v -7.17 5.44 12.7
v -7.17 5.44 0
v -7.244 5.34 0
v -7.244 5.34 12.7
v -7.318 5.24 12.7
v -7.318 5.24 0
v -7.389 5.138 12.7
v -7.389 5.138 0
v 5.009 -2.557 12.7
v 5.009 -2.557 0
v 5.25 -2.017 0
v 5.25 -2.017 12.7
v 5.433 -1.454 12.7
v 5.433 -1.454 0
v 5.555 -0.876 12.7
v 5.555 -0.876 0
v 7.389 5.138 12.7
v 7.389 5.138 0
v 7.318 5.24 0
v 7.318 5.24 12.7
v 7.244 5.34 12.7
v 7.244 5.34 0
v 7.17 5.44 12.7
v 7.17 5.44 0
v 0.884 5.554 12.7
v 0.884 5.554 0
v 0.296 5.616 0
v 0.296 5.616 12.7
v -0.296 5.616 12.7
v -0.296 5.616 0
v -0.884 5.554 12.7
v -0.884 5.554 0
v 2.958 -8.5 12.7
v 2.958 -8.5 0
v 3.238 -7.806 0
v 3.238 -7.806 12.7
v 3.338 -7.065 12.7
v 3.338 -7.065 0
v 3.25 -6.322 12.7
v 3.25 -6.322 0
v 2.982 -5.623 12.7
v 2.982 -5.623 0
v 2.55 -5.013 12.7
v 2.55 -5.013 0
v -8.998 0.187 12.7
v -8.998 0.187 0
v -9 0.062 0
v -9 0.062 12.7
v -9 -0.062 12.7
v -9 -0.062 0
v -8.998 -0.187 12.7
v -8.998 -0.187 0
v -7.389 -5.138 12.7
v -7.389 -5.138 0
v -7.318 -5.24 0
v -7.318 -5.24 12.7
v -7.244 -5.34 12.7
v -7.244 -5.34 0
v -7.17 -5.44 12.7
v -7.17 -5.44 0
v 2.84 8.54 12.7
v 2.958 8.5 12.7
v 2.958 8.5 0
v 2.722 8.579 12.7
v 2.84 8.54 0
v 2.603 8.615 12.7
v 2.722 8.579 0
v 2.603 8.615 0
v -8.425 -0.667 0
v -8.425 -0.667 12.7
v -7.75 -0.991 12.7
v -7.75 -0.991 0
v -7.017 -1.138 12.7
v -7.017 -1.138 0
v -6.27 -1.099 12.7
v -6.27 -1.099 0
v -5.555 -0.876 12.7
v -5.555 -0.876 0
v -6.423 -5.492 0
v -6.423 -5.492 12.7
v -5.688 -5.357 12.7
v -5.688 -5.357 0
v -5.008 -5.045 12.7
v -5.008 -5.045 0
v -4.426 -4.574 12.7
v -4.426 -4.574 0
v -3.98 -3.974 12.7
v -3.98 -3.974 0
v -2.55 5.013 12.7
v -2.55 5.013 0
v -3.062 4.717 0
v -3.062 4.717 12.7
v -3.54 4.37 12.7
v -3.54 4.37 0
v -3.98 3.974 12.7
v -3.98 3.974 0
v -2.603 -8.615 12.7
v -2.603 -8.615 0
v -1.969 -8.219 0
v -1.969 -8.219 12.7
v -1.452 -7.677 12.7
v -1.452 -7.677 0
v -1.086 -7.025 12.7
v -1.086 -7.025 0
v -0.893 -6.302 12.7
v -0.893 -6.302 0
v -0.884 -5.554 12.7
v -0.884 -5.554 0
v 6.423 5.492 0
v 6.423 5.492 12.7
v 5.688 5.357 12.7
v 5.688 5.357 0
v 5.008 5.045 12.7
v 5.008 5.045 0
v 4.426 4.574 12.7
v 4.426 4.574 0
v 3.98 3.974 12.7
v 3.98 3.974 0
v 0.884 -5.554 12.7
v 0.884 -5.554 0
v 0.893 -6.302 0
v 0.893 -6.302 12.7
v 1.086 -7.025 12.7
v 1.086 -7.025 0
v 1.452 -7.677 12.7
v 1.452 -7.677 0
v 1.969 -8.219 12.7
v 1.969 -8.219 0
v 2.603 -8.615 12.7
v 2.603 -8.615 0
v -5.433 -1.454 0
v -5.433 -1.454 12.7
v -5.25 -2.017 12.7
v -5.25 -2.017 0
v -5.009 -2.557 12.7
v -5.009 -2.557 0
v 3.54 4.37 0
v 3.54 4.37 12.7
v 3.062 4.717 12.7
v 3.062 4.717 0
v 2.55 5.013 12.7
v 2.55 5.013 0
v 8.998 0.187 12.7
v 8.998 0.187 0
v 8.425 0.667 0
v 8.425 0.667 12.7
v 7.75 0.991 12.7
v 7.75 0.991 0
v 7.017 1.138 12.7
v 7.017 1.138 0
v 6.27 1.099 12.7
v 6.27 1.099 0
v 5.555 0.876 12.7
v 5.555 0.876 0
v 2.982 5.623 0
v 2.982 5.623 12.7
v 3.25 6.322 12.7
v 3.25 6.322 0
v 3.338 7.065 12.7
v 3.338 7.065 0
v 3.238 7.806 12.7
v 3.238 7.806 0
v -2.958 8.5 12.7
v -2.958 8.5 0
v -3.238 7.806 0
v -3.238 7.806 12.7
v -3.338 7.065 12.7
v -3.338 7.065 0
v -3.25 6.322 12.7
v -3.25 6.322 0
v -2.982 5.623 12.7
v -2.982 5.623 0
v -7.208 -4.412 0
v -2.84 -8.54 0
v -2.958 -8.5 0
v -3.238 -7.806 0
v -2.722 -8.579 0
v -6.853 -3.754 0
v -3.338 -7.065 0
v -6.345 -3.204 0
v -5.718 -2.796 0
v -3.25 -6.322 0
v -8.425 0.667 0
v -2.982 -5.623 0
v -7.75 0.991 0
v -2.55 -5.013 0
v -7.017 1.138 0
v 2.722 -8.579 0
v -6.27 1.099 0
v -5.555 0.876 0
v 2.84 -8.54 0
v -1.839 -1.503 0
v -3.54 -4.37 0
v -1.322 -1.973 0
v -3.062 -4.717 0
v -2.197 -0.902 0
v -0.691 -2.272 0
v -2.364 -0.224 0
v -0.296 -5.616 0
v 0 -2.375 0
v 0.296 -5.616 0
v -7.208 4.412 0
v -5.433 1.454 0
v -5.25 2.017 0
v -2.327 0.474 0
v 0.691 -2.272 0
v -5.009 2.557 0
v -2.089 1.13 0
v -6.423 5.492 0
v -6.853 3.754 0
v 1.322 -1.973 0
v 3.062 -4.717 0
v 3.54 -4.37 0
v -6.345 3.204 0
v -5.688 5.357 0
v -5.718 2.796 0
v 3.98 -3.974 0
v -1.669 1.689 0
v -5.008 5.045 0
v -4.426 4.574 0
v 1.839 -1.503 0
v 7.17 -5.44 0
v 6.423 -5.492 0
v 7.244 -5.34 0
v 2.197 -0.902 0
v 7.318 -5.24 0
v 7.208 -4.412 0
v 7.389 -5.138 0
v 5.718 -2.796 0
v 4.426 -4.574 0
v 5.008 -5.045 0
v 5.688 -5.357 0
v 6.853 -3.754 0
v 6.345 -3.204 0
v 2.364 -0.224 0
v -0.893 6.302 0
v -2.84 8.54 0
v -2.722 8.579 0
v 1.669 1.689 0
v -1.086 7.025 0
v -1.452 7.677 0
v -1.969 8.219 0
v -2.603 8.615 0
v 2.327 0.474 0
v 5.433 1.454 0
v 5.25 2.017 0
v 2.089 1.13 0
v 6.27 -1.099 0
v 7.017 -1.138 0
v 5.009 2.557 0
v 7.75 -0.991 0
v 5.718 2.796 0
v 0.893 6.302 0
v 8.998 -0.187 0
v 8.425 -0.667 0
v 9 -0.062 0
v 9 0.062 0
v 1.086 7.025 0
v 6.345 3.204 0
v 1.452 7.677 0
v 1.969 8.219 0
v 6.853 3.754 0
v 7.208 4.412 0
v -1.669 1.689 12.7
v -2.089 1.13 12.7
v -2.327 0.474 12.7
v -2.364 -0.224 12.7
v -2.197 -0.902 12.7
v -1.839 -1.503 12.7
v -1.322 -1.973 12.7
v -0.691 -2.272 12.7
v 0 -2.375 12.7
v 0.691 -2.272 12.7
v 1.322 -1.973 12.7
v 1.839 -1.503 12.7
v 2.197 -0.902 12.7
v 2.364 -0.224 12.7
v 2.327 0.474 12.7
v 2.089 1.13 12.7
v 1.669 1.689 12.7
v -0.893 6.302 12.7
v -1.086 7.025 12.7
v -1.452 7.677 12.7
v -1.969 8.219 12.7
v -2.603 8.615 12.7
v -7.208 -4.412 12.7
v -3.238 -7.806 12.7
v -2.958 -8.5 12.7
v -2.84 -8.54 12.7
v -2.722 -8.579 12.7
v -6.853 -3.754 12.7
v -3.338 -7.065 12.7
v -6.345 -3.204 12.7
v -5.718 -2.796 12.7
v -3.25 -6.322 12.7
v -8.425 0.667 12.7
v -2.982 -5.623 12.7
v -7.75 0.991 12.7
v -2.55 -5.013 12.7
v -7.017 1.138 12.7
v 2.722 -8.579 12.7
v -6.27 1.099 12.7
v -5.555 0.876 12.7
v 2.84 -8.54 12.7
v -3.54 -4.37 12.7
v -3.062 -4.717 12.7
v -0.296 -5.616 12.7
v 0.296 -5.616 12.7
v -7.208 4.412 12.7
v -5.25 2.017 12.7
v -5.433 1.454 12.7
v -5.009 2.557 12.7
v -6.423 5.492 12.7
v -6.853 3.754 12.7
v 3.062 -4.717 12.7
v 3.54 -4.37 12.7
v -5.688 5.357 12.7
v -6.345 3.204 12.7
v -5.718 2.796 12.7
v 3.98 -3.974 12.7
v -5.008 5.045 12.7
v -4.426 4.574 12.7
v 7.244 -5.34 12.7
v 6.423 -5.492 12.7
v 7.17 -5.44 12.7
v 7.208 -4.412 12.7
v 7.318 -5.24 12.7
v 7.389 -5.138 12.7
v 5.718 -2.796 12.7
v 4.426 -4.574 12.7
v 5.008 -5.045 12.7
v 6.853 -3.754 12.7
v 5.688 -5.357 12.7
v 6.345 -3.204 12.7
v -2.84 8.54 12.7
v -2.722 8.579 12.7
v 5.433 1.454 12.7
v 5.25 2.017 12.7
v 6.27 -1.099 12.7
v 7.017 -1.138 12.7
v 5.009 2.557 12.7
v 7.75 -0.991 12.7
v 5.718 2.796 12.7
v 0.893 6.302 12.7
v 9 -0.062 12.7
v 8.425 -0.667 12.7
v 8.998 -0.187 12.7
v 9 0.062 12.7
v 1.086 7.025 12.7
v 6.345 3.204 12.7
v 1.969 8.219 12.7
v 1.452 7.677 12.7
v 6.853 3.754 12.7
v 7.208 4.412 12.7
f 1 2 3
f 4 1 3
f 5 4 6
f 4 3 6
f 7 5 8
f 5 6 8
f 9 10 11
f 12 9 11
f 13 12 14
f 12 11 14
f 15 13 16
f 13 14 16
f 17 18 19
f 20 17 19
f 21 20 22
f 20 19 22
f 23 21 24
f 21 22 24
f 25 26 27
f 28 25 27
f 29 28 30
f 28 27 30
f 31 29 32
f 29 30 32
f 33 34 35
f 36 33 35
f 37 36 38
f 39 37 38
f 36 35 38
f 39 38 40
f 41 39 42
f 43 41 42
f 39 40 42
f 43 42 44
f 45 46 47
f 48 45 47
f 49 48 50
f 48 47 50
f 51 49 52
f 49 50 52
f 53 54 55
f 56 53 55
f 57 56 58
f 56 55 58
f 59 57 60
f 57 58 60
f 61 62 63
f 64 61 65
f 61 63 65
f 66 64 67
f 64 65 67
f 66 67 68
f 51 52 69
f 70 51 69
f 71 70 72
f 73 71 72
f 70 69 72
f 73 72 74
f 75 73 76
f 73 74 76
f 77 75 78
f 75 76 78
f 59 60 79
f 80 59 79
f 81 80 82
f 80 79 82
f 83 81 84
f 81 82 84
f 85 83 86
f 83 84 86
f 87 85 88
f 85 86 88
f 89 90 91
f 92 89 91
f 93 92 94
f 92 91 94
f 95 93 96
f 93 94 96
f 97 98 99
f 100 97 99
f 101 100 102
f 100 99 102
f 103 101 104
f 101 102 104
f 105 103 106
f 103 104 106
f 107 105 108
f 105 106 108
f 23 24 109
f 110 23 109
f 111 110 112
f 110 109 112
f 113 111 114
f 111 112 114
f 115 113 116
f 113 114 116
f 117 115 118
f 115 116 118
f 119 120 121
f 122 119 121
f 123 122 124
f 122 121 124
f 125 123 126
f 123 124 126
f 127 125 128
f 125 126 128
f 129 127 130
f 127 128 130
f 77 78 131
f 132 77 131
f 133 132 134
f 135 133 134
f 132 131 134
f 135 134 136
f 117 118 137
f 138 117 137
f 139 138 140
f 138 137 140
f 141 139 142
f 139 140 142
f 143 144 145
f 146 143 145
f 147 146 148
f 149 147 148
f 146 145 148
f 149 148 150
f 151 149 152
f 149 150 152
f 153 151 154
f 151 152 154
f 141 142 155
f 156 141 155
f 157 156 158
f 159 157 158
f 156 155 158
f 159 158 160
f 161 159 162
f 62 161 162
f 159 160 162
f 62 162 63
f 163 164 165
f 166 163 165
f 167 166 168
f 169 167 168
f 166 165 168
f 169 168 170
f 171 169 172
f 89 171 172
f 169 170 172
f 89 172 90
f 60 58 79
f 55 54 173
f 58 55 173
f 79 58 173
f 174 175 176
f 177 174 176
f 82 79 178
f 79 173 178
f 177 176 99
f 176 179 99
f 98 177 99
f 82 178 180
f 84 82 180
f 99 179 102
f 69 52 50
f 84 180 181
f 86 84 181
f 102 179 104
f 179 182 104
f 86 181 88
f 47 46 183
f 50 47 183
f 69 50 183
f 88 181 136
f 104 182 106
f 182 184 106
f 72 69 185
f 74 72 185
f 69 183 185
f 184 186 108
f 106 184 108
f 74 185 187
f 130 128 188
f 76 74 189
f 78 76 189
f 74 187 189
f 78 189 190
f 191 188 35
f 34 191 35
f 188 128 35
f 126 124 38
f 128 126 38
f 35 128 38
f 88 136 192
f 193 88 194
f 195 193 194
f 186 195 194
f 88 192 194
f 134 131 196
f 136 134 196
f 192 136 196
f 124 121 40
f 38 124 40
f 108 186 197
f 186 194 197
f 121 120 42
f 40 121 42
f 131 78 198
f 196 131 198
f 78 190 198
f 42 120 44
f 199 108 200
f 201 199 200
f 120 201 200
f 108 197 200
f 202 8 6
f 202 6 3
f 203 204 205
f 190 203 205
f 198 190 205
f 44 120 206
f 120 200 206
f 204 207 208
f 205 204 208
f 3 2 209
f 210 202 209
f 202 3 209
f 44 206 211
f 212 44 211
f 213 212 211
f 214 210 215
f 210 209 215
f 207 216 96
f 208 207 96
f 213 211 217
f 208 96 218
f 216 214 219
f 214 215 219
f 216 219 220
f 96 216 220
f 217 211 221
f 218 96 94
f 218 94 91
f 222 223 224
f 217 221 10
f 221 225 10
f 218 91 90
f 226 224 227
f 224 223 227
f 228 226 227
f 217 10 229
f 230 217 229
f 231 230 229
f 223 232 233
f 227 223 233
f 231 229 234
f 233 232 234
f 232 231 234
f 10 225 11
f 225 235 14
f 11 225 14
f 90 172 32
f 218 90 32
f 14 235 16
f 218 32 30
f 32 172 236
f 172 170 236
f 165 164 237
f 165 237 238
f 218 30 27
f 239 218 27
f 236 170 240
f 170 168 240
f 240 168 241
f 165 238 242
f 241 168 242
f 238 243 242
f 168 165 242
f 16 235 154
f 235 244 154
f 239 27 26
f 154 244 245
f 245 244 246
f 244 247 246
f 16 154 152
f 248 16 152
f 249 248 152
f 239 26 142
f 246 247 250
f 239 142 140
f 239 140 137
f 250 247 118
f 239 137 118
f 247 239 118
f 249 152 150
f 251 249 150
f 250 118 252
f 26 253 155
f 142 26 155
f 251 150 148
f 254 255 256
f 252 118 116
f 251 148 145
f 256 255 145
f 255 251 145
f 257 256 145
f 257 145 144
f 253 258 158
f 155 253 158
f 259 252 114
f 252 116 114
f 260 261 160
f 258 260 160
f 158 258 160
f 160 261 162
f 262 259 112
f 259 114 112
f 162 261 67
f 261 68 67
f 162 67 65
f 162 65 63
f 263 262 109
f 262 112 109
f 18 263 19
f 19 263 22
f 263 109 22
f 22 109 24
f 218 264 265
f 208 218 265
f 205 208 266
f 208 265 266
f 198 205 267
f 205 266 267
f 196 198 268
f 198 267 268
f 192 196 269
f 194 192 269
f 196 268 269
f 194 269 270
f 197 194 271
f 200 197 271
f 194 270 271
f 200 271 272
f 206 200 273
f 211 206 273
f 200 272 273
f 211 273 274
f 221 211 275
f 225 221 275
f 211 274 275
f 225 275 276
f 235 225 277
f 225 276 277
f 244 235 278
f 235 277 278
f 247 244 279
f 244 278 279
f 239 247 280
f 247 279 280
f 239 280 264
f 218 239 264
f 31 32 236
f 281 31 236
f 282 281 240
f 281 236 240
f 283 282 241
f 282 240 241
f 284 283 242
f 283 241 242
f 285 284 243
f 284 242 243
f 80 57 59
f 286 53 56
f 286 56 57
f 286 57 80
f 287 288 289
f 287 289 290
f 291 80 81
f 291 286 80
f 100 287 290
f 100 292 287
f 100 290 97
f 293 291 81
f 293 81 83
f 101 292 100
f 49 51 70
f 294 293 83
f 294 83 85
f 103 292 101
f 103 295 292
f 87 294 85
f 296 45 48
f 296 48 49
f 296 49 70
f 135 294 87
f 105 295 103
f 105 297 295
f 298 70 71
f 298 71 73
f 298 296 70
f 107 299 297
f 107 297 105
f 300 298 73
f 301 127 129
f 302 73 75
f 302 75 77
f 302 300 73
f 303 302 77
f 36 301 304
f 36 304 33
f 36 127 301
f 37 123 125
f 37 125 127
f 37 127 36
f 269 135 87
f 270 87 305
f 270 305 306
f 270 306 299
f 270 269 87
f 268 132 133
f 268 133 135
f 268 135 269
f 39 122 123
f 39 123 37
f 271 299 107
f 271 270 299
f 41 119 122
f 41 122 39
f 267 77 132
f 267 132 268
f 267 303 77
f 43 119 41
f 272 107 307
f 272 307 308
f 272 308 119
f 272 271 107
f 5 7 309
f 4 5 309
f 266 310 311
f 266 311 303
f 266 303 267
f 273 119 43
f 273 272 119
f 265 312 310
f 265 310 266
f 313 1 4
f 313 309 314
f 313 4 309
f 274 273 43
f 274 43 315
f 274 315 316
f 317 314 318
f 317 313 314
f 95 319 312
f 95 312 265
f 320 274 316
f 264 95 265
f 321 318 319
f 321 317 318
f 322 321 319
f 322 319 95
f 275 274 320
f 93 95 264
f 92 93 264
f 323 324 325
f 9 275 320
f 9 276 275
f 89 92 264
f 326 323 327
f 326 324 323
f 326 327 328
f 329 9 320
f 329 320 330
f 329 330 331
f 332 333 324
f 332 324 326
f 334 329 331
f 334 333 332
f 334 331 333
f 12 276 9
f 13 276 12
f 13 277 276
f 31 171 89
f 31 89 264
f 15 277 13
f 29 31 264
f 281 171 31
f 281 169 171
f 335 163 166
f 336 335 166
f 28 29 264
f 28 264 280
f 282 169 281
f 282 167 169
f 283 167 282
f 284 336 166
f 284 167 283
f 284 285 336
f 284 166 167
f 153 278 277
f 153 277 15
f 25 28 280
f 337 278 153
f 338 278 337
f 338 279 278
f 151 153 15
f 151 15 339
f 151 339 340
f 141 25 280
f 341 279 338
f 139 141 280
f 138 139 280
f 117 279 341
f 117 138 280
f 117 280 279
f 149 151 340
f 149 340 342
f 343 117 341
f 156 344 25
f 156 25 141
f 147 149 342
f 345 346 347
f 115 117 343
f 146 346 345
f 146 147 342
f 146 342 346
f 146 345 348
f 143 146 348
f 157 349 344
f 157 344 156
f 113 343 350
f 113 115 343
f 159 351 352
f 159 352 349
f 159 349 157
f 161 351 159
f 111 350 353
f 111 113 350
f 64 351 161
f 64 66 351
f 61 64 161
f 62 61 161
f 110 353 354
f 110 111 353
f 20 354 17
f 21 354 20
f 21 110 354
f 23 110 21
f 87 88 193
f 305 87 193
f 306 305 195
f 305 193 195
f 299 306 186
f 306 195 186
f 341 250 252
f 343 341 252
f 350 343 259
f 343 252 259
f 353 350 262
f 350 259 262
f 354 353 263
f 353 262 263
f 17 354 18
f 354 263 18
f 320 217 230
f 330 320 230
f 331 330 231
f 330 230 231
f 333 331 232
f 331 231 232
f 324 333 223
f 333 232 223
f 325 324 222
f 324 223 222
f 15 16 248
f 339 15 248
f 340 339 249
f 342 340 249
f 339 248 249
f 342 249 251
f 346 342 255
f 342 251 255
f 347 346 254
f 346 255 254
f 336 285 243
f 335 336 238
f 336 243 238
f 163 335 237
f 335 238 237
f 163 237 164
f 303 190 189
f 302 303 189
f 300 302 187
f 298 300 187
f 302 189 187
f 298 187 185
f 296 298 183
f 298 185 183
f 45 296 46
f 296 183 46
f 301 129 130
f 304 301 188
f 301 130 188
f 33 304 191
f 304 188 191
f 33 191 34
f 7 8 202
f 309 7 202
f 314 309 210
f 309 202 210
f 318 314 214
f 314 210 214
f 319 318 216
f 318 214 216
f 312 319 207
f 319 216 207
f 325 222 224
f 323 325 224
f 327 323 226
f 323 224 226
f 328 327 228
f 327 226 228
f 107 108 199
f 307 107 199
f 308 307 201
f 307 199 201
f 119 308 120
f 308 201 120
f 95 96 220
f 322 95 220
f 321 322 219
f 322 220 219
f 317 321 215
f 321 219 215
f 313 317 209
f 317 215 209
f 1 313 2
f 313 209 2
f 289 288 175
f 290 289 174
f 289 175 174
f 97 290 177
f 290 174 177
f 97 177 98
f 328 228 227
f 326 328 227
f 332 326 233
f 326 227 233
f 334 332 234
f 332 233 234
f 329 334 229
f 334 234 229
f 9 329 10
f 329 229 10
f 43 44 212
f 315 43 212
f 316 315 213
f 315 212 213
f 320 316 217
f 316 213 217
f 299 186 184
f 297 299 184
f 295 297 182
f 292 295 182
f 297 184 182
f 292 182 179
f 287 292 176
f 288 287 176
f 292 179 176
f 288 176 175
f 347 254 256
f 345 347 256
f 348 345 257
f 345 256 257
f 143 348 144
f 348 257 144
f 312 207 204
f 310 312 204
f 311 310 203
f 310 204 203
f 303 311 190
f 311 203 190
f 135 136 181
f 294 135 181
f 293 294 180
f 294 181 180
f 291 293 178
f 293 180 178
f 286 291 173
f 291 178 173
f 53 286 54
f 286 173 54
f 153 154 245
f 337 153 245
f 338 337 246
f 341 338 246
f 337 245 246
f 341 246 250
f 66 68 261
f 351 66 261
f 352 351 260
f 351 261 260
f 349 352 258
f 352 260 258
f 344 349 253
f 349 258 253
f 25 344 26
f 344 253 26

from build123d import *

# Parameters (mm, degrees)
BOSS_EXTRUDE1_DEPTH = 12.7
CUT_EXTRUDE1_REACH  = 19.791


with BuildPart() as part:
    # Sketch1 → Boss-Extrude1 (new body)
    with BuildSketch(Plane.XY):
        with BuildLine():
            ThreePointArc((-7.16977096, 5.440072093), (-7.281152949, 5.290067271), (-7.389397086, 5.137782665))
            ThreePointArc((-7.389397086, 5.137782665), (-6.616232826, 3.46280058), (-5.009138832, 2.556932568))
            ThreePointArc((-5.009138832, 2.556932568), (-5.348741848, 1.737911576), (-5.555405697, 0.875696031))
            ThreePointArc((-5.555405697, 0.875696031), (-7.388027907, 1.087459563), (-8.9980607, 0.186825141))
            ThreePointArc((-8.9980607, 0.186825141), (-9, 0), (-8.9980607, -0.186825141))
            ThreePointArc((-8.9980607, -0.186825141), (-7.388027907, -1.087459563), (-5.555405697, -0.875696031))
            ThreePointArc((-5.555405697, -0.875696031), (-5.348741848, -1.737911576), (-5.009138832, -2.556932568))
            ThreePointArc((-5.009138832, -2.556932568), (-6.616232826, -3.46280058), (-7.389397086, -5.137782665))
            ThreePointArc((-7.389397086, -5.137782665), (-7.281152949, -5.290067271), (-7.16977096, -5.440072093))
            ThreePointArc((-7.16977096, -5.440072093), (-5.337847438, -5.222347115), (-3.979696407, -3.97383851))
            ThreePointArc((-3.979696407, -3.97383851), (-3.305704259, -4.549911576), (-2.549551188, -5.012899834))
            ThreePointArc((-2.549551188, -5.012899834), (-3.317261682, -6.690388598), (-2.958234941, -8.49993212))
            ThreePointArc((-2.958234941, -8.49993212), (-2.781152949, -8.559508647), (-2.602872405, -8.615396407))
            ThreePointArc((-2.602872405, -8.615396407), (-1.248790674, -7.362475569), (-0.883878355, -5.554109745))
            ThreePointArc((-0.883878355, -5.554109745), (0, -5.624), (0.883878355, -5.554109745))
            ThreePointArc((0.883878355, -5.554109745), (1.248790674, -7.362475569), (2.602872405, -8.615396407))
            ThreePointArc((2.602872405, -8.615396407), (2.781152949, -8.559508647), (2.958234941, -8.49993212))
            ThreePointArc((2.958234941, -8.49993212), (3.317261682, -6.690388598), (2.549551188, -5.012899834))
            ThreePointArc((2.549551188, -5.012899834), (3.305704259, -4.549911576), (3.979696407, -3.97383851))
            ThreePointArc((3.979696407, -3.97383851), (5.337847438, -5.222347115), (7.16977096, -5.440072093))
            ThreePointArc((7.16977096, -5.440072093), (7.281152949, -5.290067271), (7.389397086, -5.137782665))
            ThreePointArc((7.389397086, -5.137782665), (6.616232826, -3.46280058), (5.009138832, -2.556932568))
            ThreePointArc((5.009138832, -2.556932568), (5.348741848, -1.737911576), (5.555405697, -0.875696031))
            ThreePointArc((5.555405697, -0.875696031), (7.388027907, -1.087459563), (8.9980607, -0.186825141))
            ThreePointArc((8.9980607, -0.186825141), (9, 0), (8.9980607, 0.186825141))
            ThreePointArc((8.9980607, 0.186825141), (7.388027907, 1.087459563), (5.555405697, 0.875696031))
            ThreePointArc((5.555405697, 0.875696031), (5.348741848, 1.737911576), (5.009138832, 2.556932568))
            ThreePointArc((5.009138832, 2.556932568), (6.616232826, 3.46280058), (7.389397086, 5.137782665))
            ThreePointArc((7.389397086, 5.137782665), (7.281152949, 5.290067271), (7.16977096, 5.440072093))
            ThreePointArc((7.16977096, 5.440072093), (5.337847438, 5.222347115), (3.979696407, 3.97383851))
            ThreePointArc((3.979696407, 3.97383851), (3.305704259, 4.549911576), (2.549551188, 5.012899834))
            ThreePointArc((2.549551188, 5.012899834), (3.317261682, 6.690388598), (2.958234941, 8.49993212))
            ThreePointArc((2.958234941, 8.49993212), (2.781152949, 8.559508647), (2.602872405, 8.615396407))
            ThreePointArc((2.602872405, 8.615396407), (1.248790674, 7.362475569), (0.883878355, 5.554109745))
            ThreePointArc((0.883878355, 5.554109745), (0, 5.624), (-0.883878355, 5.554109745))
            ThreePointArc((-0.883878355, 5.554109745), (-1.248790674, 7.362475569), (-2.602872405, 8.615396407))
            ThreePointArc((-2.602872405, 8.615396407), (-2.781152949, 8.559508647), (-2.958234941, 8.49993212))
            ThreePointArc((-2.958234941, 8.49993212), (-3.317261682, 6.690388598), (-2.549551188, 5.012899834))
            ThreePointArc((-2.549551188, 5.012899834), (-3.305704259, 4.549911576), (-3.979696407, 3.97383851))
            ThreePointArc((-3.979696407, 3.97383851), (-5.337847438, 5.222347115), (-7.16977096, 5.440072093))
        make_face()
    extrude(amount=BOSS_EXTRUDE1_DEPTH)

    # Sketch2 → Cut-Extrude1 (cut, up to next)
    with BuildSketch(Plane.XY.offset(12.7), mode=Mode.PRIVATE) as cut_extrude1_sk1:
        with BuildLine():
            Line((1.669458355, 1.6891), (-1.669458355, 1.6891))
            ThreePointArc((-1.669458355, 1.6891), (0, -2.3749), (1.669458355, 1.6891))
        make_face()
    cut_extrude1_tool1 = extrude(cut_extrude1_sk1.sketch, amount=-CUT_EXTRUDE1_REACH, mode=Mode.PRIVATE) & part.part
    add(cut_extrude1_tool1.solids().sort_by_distance((0, -0.192165, 12.7))[0], mode=Mode.SUBTRACT)


solid = part.part
